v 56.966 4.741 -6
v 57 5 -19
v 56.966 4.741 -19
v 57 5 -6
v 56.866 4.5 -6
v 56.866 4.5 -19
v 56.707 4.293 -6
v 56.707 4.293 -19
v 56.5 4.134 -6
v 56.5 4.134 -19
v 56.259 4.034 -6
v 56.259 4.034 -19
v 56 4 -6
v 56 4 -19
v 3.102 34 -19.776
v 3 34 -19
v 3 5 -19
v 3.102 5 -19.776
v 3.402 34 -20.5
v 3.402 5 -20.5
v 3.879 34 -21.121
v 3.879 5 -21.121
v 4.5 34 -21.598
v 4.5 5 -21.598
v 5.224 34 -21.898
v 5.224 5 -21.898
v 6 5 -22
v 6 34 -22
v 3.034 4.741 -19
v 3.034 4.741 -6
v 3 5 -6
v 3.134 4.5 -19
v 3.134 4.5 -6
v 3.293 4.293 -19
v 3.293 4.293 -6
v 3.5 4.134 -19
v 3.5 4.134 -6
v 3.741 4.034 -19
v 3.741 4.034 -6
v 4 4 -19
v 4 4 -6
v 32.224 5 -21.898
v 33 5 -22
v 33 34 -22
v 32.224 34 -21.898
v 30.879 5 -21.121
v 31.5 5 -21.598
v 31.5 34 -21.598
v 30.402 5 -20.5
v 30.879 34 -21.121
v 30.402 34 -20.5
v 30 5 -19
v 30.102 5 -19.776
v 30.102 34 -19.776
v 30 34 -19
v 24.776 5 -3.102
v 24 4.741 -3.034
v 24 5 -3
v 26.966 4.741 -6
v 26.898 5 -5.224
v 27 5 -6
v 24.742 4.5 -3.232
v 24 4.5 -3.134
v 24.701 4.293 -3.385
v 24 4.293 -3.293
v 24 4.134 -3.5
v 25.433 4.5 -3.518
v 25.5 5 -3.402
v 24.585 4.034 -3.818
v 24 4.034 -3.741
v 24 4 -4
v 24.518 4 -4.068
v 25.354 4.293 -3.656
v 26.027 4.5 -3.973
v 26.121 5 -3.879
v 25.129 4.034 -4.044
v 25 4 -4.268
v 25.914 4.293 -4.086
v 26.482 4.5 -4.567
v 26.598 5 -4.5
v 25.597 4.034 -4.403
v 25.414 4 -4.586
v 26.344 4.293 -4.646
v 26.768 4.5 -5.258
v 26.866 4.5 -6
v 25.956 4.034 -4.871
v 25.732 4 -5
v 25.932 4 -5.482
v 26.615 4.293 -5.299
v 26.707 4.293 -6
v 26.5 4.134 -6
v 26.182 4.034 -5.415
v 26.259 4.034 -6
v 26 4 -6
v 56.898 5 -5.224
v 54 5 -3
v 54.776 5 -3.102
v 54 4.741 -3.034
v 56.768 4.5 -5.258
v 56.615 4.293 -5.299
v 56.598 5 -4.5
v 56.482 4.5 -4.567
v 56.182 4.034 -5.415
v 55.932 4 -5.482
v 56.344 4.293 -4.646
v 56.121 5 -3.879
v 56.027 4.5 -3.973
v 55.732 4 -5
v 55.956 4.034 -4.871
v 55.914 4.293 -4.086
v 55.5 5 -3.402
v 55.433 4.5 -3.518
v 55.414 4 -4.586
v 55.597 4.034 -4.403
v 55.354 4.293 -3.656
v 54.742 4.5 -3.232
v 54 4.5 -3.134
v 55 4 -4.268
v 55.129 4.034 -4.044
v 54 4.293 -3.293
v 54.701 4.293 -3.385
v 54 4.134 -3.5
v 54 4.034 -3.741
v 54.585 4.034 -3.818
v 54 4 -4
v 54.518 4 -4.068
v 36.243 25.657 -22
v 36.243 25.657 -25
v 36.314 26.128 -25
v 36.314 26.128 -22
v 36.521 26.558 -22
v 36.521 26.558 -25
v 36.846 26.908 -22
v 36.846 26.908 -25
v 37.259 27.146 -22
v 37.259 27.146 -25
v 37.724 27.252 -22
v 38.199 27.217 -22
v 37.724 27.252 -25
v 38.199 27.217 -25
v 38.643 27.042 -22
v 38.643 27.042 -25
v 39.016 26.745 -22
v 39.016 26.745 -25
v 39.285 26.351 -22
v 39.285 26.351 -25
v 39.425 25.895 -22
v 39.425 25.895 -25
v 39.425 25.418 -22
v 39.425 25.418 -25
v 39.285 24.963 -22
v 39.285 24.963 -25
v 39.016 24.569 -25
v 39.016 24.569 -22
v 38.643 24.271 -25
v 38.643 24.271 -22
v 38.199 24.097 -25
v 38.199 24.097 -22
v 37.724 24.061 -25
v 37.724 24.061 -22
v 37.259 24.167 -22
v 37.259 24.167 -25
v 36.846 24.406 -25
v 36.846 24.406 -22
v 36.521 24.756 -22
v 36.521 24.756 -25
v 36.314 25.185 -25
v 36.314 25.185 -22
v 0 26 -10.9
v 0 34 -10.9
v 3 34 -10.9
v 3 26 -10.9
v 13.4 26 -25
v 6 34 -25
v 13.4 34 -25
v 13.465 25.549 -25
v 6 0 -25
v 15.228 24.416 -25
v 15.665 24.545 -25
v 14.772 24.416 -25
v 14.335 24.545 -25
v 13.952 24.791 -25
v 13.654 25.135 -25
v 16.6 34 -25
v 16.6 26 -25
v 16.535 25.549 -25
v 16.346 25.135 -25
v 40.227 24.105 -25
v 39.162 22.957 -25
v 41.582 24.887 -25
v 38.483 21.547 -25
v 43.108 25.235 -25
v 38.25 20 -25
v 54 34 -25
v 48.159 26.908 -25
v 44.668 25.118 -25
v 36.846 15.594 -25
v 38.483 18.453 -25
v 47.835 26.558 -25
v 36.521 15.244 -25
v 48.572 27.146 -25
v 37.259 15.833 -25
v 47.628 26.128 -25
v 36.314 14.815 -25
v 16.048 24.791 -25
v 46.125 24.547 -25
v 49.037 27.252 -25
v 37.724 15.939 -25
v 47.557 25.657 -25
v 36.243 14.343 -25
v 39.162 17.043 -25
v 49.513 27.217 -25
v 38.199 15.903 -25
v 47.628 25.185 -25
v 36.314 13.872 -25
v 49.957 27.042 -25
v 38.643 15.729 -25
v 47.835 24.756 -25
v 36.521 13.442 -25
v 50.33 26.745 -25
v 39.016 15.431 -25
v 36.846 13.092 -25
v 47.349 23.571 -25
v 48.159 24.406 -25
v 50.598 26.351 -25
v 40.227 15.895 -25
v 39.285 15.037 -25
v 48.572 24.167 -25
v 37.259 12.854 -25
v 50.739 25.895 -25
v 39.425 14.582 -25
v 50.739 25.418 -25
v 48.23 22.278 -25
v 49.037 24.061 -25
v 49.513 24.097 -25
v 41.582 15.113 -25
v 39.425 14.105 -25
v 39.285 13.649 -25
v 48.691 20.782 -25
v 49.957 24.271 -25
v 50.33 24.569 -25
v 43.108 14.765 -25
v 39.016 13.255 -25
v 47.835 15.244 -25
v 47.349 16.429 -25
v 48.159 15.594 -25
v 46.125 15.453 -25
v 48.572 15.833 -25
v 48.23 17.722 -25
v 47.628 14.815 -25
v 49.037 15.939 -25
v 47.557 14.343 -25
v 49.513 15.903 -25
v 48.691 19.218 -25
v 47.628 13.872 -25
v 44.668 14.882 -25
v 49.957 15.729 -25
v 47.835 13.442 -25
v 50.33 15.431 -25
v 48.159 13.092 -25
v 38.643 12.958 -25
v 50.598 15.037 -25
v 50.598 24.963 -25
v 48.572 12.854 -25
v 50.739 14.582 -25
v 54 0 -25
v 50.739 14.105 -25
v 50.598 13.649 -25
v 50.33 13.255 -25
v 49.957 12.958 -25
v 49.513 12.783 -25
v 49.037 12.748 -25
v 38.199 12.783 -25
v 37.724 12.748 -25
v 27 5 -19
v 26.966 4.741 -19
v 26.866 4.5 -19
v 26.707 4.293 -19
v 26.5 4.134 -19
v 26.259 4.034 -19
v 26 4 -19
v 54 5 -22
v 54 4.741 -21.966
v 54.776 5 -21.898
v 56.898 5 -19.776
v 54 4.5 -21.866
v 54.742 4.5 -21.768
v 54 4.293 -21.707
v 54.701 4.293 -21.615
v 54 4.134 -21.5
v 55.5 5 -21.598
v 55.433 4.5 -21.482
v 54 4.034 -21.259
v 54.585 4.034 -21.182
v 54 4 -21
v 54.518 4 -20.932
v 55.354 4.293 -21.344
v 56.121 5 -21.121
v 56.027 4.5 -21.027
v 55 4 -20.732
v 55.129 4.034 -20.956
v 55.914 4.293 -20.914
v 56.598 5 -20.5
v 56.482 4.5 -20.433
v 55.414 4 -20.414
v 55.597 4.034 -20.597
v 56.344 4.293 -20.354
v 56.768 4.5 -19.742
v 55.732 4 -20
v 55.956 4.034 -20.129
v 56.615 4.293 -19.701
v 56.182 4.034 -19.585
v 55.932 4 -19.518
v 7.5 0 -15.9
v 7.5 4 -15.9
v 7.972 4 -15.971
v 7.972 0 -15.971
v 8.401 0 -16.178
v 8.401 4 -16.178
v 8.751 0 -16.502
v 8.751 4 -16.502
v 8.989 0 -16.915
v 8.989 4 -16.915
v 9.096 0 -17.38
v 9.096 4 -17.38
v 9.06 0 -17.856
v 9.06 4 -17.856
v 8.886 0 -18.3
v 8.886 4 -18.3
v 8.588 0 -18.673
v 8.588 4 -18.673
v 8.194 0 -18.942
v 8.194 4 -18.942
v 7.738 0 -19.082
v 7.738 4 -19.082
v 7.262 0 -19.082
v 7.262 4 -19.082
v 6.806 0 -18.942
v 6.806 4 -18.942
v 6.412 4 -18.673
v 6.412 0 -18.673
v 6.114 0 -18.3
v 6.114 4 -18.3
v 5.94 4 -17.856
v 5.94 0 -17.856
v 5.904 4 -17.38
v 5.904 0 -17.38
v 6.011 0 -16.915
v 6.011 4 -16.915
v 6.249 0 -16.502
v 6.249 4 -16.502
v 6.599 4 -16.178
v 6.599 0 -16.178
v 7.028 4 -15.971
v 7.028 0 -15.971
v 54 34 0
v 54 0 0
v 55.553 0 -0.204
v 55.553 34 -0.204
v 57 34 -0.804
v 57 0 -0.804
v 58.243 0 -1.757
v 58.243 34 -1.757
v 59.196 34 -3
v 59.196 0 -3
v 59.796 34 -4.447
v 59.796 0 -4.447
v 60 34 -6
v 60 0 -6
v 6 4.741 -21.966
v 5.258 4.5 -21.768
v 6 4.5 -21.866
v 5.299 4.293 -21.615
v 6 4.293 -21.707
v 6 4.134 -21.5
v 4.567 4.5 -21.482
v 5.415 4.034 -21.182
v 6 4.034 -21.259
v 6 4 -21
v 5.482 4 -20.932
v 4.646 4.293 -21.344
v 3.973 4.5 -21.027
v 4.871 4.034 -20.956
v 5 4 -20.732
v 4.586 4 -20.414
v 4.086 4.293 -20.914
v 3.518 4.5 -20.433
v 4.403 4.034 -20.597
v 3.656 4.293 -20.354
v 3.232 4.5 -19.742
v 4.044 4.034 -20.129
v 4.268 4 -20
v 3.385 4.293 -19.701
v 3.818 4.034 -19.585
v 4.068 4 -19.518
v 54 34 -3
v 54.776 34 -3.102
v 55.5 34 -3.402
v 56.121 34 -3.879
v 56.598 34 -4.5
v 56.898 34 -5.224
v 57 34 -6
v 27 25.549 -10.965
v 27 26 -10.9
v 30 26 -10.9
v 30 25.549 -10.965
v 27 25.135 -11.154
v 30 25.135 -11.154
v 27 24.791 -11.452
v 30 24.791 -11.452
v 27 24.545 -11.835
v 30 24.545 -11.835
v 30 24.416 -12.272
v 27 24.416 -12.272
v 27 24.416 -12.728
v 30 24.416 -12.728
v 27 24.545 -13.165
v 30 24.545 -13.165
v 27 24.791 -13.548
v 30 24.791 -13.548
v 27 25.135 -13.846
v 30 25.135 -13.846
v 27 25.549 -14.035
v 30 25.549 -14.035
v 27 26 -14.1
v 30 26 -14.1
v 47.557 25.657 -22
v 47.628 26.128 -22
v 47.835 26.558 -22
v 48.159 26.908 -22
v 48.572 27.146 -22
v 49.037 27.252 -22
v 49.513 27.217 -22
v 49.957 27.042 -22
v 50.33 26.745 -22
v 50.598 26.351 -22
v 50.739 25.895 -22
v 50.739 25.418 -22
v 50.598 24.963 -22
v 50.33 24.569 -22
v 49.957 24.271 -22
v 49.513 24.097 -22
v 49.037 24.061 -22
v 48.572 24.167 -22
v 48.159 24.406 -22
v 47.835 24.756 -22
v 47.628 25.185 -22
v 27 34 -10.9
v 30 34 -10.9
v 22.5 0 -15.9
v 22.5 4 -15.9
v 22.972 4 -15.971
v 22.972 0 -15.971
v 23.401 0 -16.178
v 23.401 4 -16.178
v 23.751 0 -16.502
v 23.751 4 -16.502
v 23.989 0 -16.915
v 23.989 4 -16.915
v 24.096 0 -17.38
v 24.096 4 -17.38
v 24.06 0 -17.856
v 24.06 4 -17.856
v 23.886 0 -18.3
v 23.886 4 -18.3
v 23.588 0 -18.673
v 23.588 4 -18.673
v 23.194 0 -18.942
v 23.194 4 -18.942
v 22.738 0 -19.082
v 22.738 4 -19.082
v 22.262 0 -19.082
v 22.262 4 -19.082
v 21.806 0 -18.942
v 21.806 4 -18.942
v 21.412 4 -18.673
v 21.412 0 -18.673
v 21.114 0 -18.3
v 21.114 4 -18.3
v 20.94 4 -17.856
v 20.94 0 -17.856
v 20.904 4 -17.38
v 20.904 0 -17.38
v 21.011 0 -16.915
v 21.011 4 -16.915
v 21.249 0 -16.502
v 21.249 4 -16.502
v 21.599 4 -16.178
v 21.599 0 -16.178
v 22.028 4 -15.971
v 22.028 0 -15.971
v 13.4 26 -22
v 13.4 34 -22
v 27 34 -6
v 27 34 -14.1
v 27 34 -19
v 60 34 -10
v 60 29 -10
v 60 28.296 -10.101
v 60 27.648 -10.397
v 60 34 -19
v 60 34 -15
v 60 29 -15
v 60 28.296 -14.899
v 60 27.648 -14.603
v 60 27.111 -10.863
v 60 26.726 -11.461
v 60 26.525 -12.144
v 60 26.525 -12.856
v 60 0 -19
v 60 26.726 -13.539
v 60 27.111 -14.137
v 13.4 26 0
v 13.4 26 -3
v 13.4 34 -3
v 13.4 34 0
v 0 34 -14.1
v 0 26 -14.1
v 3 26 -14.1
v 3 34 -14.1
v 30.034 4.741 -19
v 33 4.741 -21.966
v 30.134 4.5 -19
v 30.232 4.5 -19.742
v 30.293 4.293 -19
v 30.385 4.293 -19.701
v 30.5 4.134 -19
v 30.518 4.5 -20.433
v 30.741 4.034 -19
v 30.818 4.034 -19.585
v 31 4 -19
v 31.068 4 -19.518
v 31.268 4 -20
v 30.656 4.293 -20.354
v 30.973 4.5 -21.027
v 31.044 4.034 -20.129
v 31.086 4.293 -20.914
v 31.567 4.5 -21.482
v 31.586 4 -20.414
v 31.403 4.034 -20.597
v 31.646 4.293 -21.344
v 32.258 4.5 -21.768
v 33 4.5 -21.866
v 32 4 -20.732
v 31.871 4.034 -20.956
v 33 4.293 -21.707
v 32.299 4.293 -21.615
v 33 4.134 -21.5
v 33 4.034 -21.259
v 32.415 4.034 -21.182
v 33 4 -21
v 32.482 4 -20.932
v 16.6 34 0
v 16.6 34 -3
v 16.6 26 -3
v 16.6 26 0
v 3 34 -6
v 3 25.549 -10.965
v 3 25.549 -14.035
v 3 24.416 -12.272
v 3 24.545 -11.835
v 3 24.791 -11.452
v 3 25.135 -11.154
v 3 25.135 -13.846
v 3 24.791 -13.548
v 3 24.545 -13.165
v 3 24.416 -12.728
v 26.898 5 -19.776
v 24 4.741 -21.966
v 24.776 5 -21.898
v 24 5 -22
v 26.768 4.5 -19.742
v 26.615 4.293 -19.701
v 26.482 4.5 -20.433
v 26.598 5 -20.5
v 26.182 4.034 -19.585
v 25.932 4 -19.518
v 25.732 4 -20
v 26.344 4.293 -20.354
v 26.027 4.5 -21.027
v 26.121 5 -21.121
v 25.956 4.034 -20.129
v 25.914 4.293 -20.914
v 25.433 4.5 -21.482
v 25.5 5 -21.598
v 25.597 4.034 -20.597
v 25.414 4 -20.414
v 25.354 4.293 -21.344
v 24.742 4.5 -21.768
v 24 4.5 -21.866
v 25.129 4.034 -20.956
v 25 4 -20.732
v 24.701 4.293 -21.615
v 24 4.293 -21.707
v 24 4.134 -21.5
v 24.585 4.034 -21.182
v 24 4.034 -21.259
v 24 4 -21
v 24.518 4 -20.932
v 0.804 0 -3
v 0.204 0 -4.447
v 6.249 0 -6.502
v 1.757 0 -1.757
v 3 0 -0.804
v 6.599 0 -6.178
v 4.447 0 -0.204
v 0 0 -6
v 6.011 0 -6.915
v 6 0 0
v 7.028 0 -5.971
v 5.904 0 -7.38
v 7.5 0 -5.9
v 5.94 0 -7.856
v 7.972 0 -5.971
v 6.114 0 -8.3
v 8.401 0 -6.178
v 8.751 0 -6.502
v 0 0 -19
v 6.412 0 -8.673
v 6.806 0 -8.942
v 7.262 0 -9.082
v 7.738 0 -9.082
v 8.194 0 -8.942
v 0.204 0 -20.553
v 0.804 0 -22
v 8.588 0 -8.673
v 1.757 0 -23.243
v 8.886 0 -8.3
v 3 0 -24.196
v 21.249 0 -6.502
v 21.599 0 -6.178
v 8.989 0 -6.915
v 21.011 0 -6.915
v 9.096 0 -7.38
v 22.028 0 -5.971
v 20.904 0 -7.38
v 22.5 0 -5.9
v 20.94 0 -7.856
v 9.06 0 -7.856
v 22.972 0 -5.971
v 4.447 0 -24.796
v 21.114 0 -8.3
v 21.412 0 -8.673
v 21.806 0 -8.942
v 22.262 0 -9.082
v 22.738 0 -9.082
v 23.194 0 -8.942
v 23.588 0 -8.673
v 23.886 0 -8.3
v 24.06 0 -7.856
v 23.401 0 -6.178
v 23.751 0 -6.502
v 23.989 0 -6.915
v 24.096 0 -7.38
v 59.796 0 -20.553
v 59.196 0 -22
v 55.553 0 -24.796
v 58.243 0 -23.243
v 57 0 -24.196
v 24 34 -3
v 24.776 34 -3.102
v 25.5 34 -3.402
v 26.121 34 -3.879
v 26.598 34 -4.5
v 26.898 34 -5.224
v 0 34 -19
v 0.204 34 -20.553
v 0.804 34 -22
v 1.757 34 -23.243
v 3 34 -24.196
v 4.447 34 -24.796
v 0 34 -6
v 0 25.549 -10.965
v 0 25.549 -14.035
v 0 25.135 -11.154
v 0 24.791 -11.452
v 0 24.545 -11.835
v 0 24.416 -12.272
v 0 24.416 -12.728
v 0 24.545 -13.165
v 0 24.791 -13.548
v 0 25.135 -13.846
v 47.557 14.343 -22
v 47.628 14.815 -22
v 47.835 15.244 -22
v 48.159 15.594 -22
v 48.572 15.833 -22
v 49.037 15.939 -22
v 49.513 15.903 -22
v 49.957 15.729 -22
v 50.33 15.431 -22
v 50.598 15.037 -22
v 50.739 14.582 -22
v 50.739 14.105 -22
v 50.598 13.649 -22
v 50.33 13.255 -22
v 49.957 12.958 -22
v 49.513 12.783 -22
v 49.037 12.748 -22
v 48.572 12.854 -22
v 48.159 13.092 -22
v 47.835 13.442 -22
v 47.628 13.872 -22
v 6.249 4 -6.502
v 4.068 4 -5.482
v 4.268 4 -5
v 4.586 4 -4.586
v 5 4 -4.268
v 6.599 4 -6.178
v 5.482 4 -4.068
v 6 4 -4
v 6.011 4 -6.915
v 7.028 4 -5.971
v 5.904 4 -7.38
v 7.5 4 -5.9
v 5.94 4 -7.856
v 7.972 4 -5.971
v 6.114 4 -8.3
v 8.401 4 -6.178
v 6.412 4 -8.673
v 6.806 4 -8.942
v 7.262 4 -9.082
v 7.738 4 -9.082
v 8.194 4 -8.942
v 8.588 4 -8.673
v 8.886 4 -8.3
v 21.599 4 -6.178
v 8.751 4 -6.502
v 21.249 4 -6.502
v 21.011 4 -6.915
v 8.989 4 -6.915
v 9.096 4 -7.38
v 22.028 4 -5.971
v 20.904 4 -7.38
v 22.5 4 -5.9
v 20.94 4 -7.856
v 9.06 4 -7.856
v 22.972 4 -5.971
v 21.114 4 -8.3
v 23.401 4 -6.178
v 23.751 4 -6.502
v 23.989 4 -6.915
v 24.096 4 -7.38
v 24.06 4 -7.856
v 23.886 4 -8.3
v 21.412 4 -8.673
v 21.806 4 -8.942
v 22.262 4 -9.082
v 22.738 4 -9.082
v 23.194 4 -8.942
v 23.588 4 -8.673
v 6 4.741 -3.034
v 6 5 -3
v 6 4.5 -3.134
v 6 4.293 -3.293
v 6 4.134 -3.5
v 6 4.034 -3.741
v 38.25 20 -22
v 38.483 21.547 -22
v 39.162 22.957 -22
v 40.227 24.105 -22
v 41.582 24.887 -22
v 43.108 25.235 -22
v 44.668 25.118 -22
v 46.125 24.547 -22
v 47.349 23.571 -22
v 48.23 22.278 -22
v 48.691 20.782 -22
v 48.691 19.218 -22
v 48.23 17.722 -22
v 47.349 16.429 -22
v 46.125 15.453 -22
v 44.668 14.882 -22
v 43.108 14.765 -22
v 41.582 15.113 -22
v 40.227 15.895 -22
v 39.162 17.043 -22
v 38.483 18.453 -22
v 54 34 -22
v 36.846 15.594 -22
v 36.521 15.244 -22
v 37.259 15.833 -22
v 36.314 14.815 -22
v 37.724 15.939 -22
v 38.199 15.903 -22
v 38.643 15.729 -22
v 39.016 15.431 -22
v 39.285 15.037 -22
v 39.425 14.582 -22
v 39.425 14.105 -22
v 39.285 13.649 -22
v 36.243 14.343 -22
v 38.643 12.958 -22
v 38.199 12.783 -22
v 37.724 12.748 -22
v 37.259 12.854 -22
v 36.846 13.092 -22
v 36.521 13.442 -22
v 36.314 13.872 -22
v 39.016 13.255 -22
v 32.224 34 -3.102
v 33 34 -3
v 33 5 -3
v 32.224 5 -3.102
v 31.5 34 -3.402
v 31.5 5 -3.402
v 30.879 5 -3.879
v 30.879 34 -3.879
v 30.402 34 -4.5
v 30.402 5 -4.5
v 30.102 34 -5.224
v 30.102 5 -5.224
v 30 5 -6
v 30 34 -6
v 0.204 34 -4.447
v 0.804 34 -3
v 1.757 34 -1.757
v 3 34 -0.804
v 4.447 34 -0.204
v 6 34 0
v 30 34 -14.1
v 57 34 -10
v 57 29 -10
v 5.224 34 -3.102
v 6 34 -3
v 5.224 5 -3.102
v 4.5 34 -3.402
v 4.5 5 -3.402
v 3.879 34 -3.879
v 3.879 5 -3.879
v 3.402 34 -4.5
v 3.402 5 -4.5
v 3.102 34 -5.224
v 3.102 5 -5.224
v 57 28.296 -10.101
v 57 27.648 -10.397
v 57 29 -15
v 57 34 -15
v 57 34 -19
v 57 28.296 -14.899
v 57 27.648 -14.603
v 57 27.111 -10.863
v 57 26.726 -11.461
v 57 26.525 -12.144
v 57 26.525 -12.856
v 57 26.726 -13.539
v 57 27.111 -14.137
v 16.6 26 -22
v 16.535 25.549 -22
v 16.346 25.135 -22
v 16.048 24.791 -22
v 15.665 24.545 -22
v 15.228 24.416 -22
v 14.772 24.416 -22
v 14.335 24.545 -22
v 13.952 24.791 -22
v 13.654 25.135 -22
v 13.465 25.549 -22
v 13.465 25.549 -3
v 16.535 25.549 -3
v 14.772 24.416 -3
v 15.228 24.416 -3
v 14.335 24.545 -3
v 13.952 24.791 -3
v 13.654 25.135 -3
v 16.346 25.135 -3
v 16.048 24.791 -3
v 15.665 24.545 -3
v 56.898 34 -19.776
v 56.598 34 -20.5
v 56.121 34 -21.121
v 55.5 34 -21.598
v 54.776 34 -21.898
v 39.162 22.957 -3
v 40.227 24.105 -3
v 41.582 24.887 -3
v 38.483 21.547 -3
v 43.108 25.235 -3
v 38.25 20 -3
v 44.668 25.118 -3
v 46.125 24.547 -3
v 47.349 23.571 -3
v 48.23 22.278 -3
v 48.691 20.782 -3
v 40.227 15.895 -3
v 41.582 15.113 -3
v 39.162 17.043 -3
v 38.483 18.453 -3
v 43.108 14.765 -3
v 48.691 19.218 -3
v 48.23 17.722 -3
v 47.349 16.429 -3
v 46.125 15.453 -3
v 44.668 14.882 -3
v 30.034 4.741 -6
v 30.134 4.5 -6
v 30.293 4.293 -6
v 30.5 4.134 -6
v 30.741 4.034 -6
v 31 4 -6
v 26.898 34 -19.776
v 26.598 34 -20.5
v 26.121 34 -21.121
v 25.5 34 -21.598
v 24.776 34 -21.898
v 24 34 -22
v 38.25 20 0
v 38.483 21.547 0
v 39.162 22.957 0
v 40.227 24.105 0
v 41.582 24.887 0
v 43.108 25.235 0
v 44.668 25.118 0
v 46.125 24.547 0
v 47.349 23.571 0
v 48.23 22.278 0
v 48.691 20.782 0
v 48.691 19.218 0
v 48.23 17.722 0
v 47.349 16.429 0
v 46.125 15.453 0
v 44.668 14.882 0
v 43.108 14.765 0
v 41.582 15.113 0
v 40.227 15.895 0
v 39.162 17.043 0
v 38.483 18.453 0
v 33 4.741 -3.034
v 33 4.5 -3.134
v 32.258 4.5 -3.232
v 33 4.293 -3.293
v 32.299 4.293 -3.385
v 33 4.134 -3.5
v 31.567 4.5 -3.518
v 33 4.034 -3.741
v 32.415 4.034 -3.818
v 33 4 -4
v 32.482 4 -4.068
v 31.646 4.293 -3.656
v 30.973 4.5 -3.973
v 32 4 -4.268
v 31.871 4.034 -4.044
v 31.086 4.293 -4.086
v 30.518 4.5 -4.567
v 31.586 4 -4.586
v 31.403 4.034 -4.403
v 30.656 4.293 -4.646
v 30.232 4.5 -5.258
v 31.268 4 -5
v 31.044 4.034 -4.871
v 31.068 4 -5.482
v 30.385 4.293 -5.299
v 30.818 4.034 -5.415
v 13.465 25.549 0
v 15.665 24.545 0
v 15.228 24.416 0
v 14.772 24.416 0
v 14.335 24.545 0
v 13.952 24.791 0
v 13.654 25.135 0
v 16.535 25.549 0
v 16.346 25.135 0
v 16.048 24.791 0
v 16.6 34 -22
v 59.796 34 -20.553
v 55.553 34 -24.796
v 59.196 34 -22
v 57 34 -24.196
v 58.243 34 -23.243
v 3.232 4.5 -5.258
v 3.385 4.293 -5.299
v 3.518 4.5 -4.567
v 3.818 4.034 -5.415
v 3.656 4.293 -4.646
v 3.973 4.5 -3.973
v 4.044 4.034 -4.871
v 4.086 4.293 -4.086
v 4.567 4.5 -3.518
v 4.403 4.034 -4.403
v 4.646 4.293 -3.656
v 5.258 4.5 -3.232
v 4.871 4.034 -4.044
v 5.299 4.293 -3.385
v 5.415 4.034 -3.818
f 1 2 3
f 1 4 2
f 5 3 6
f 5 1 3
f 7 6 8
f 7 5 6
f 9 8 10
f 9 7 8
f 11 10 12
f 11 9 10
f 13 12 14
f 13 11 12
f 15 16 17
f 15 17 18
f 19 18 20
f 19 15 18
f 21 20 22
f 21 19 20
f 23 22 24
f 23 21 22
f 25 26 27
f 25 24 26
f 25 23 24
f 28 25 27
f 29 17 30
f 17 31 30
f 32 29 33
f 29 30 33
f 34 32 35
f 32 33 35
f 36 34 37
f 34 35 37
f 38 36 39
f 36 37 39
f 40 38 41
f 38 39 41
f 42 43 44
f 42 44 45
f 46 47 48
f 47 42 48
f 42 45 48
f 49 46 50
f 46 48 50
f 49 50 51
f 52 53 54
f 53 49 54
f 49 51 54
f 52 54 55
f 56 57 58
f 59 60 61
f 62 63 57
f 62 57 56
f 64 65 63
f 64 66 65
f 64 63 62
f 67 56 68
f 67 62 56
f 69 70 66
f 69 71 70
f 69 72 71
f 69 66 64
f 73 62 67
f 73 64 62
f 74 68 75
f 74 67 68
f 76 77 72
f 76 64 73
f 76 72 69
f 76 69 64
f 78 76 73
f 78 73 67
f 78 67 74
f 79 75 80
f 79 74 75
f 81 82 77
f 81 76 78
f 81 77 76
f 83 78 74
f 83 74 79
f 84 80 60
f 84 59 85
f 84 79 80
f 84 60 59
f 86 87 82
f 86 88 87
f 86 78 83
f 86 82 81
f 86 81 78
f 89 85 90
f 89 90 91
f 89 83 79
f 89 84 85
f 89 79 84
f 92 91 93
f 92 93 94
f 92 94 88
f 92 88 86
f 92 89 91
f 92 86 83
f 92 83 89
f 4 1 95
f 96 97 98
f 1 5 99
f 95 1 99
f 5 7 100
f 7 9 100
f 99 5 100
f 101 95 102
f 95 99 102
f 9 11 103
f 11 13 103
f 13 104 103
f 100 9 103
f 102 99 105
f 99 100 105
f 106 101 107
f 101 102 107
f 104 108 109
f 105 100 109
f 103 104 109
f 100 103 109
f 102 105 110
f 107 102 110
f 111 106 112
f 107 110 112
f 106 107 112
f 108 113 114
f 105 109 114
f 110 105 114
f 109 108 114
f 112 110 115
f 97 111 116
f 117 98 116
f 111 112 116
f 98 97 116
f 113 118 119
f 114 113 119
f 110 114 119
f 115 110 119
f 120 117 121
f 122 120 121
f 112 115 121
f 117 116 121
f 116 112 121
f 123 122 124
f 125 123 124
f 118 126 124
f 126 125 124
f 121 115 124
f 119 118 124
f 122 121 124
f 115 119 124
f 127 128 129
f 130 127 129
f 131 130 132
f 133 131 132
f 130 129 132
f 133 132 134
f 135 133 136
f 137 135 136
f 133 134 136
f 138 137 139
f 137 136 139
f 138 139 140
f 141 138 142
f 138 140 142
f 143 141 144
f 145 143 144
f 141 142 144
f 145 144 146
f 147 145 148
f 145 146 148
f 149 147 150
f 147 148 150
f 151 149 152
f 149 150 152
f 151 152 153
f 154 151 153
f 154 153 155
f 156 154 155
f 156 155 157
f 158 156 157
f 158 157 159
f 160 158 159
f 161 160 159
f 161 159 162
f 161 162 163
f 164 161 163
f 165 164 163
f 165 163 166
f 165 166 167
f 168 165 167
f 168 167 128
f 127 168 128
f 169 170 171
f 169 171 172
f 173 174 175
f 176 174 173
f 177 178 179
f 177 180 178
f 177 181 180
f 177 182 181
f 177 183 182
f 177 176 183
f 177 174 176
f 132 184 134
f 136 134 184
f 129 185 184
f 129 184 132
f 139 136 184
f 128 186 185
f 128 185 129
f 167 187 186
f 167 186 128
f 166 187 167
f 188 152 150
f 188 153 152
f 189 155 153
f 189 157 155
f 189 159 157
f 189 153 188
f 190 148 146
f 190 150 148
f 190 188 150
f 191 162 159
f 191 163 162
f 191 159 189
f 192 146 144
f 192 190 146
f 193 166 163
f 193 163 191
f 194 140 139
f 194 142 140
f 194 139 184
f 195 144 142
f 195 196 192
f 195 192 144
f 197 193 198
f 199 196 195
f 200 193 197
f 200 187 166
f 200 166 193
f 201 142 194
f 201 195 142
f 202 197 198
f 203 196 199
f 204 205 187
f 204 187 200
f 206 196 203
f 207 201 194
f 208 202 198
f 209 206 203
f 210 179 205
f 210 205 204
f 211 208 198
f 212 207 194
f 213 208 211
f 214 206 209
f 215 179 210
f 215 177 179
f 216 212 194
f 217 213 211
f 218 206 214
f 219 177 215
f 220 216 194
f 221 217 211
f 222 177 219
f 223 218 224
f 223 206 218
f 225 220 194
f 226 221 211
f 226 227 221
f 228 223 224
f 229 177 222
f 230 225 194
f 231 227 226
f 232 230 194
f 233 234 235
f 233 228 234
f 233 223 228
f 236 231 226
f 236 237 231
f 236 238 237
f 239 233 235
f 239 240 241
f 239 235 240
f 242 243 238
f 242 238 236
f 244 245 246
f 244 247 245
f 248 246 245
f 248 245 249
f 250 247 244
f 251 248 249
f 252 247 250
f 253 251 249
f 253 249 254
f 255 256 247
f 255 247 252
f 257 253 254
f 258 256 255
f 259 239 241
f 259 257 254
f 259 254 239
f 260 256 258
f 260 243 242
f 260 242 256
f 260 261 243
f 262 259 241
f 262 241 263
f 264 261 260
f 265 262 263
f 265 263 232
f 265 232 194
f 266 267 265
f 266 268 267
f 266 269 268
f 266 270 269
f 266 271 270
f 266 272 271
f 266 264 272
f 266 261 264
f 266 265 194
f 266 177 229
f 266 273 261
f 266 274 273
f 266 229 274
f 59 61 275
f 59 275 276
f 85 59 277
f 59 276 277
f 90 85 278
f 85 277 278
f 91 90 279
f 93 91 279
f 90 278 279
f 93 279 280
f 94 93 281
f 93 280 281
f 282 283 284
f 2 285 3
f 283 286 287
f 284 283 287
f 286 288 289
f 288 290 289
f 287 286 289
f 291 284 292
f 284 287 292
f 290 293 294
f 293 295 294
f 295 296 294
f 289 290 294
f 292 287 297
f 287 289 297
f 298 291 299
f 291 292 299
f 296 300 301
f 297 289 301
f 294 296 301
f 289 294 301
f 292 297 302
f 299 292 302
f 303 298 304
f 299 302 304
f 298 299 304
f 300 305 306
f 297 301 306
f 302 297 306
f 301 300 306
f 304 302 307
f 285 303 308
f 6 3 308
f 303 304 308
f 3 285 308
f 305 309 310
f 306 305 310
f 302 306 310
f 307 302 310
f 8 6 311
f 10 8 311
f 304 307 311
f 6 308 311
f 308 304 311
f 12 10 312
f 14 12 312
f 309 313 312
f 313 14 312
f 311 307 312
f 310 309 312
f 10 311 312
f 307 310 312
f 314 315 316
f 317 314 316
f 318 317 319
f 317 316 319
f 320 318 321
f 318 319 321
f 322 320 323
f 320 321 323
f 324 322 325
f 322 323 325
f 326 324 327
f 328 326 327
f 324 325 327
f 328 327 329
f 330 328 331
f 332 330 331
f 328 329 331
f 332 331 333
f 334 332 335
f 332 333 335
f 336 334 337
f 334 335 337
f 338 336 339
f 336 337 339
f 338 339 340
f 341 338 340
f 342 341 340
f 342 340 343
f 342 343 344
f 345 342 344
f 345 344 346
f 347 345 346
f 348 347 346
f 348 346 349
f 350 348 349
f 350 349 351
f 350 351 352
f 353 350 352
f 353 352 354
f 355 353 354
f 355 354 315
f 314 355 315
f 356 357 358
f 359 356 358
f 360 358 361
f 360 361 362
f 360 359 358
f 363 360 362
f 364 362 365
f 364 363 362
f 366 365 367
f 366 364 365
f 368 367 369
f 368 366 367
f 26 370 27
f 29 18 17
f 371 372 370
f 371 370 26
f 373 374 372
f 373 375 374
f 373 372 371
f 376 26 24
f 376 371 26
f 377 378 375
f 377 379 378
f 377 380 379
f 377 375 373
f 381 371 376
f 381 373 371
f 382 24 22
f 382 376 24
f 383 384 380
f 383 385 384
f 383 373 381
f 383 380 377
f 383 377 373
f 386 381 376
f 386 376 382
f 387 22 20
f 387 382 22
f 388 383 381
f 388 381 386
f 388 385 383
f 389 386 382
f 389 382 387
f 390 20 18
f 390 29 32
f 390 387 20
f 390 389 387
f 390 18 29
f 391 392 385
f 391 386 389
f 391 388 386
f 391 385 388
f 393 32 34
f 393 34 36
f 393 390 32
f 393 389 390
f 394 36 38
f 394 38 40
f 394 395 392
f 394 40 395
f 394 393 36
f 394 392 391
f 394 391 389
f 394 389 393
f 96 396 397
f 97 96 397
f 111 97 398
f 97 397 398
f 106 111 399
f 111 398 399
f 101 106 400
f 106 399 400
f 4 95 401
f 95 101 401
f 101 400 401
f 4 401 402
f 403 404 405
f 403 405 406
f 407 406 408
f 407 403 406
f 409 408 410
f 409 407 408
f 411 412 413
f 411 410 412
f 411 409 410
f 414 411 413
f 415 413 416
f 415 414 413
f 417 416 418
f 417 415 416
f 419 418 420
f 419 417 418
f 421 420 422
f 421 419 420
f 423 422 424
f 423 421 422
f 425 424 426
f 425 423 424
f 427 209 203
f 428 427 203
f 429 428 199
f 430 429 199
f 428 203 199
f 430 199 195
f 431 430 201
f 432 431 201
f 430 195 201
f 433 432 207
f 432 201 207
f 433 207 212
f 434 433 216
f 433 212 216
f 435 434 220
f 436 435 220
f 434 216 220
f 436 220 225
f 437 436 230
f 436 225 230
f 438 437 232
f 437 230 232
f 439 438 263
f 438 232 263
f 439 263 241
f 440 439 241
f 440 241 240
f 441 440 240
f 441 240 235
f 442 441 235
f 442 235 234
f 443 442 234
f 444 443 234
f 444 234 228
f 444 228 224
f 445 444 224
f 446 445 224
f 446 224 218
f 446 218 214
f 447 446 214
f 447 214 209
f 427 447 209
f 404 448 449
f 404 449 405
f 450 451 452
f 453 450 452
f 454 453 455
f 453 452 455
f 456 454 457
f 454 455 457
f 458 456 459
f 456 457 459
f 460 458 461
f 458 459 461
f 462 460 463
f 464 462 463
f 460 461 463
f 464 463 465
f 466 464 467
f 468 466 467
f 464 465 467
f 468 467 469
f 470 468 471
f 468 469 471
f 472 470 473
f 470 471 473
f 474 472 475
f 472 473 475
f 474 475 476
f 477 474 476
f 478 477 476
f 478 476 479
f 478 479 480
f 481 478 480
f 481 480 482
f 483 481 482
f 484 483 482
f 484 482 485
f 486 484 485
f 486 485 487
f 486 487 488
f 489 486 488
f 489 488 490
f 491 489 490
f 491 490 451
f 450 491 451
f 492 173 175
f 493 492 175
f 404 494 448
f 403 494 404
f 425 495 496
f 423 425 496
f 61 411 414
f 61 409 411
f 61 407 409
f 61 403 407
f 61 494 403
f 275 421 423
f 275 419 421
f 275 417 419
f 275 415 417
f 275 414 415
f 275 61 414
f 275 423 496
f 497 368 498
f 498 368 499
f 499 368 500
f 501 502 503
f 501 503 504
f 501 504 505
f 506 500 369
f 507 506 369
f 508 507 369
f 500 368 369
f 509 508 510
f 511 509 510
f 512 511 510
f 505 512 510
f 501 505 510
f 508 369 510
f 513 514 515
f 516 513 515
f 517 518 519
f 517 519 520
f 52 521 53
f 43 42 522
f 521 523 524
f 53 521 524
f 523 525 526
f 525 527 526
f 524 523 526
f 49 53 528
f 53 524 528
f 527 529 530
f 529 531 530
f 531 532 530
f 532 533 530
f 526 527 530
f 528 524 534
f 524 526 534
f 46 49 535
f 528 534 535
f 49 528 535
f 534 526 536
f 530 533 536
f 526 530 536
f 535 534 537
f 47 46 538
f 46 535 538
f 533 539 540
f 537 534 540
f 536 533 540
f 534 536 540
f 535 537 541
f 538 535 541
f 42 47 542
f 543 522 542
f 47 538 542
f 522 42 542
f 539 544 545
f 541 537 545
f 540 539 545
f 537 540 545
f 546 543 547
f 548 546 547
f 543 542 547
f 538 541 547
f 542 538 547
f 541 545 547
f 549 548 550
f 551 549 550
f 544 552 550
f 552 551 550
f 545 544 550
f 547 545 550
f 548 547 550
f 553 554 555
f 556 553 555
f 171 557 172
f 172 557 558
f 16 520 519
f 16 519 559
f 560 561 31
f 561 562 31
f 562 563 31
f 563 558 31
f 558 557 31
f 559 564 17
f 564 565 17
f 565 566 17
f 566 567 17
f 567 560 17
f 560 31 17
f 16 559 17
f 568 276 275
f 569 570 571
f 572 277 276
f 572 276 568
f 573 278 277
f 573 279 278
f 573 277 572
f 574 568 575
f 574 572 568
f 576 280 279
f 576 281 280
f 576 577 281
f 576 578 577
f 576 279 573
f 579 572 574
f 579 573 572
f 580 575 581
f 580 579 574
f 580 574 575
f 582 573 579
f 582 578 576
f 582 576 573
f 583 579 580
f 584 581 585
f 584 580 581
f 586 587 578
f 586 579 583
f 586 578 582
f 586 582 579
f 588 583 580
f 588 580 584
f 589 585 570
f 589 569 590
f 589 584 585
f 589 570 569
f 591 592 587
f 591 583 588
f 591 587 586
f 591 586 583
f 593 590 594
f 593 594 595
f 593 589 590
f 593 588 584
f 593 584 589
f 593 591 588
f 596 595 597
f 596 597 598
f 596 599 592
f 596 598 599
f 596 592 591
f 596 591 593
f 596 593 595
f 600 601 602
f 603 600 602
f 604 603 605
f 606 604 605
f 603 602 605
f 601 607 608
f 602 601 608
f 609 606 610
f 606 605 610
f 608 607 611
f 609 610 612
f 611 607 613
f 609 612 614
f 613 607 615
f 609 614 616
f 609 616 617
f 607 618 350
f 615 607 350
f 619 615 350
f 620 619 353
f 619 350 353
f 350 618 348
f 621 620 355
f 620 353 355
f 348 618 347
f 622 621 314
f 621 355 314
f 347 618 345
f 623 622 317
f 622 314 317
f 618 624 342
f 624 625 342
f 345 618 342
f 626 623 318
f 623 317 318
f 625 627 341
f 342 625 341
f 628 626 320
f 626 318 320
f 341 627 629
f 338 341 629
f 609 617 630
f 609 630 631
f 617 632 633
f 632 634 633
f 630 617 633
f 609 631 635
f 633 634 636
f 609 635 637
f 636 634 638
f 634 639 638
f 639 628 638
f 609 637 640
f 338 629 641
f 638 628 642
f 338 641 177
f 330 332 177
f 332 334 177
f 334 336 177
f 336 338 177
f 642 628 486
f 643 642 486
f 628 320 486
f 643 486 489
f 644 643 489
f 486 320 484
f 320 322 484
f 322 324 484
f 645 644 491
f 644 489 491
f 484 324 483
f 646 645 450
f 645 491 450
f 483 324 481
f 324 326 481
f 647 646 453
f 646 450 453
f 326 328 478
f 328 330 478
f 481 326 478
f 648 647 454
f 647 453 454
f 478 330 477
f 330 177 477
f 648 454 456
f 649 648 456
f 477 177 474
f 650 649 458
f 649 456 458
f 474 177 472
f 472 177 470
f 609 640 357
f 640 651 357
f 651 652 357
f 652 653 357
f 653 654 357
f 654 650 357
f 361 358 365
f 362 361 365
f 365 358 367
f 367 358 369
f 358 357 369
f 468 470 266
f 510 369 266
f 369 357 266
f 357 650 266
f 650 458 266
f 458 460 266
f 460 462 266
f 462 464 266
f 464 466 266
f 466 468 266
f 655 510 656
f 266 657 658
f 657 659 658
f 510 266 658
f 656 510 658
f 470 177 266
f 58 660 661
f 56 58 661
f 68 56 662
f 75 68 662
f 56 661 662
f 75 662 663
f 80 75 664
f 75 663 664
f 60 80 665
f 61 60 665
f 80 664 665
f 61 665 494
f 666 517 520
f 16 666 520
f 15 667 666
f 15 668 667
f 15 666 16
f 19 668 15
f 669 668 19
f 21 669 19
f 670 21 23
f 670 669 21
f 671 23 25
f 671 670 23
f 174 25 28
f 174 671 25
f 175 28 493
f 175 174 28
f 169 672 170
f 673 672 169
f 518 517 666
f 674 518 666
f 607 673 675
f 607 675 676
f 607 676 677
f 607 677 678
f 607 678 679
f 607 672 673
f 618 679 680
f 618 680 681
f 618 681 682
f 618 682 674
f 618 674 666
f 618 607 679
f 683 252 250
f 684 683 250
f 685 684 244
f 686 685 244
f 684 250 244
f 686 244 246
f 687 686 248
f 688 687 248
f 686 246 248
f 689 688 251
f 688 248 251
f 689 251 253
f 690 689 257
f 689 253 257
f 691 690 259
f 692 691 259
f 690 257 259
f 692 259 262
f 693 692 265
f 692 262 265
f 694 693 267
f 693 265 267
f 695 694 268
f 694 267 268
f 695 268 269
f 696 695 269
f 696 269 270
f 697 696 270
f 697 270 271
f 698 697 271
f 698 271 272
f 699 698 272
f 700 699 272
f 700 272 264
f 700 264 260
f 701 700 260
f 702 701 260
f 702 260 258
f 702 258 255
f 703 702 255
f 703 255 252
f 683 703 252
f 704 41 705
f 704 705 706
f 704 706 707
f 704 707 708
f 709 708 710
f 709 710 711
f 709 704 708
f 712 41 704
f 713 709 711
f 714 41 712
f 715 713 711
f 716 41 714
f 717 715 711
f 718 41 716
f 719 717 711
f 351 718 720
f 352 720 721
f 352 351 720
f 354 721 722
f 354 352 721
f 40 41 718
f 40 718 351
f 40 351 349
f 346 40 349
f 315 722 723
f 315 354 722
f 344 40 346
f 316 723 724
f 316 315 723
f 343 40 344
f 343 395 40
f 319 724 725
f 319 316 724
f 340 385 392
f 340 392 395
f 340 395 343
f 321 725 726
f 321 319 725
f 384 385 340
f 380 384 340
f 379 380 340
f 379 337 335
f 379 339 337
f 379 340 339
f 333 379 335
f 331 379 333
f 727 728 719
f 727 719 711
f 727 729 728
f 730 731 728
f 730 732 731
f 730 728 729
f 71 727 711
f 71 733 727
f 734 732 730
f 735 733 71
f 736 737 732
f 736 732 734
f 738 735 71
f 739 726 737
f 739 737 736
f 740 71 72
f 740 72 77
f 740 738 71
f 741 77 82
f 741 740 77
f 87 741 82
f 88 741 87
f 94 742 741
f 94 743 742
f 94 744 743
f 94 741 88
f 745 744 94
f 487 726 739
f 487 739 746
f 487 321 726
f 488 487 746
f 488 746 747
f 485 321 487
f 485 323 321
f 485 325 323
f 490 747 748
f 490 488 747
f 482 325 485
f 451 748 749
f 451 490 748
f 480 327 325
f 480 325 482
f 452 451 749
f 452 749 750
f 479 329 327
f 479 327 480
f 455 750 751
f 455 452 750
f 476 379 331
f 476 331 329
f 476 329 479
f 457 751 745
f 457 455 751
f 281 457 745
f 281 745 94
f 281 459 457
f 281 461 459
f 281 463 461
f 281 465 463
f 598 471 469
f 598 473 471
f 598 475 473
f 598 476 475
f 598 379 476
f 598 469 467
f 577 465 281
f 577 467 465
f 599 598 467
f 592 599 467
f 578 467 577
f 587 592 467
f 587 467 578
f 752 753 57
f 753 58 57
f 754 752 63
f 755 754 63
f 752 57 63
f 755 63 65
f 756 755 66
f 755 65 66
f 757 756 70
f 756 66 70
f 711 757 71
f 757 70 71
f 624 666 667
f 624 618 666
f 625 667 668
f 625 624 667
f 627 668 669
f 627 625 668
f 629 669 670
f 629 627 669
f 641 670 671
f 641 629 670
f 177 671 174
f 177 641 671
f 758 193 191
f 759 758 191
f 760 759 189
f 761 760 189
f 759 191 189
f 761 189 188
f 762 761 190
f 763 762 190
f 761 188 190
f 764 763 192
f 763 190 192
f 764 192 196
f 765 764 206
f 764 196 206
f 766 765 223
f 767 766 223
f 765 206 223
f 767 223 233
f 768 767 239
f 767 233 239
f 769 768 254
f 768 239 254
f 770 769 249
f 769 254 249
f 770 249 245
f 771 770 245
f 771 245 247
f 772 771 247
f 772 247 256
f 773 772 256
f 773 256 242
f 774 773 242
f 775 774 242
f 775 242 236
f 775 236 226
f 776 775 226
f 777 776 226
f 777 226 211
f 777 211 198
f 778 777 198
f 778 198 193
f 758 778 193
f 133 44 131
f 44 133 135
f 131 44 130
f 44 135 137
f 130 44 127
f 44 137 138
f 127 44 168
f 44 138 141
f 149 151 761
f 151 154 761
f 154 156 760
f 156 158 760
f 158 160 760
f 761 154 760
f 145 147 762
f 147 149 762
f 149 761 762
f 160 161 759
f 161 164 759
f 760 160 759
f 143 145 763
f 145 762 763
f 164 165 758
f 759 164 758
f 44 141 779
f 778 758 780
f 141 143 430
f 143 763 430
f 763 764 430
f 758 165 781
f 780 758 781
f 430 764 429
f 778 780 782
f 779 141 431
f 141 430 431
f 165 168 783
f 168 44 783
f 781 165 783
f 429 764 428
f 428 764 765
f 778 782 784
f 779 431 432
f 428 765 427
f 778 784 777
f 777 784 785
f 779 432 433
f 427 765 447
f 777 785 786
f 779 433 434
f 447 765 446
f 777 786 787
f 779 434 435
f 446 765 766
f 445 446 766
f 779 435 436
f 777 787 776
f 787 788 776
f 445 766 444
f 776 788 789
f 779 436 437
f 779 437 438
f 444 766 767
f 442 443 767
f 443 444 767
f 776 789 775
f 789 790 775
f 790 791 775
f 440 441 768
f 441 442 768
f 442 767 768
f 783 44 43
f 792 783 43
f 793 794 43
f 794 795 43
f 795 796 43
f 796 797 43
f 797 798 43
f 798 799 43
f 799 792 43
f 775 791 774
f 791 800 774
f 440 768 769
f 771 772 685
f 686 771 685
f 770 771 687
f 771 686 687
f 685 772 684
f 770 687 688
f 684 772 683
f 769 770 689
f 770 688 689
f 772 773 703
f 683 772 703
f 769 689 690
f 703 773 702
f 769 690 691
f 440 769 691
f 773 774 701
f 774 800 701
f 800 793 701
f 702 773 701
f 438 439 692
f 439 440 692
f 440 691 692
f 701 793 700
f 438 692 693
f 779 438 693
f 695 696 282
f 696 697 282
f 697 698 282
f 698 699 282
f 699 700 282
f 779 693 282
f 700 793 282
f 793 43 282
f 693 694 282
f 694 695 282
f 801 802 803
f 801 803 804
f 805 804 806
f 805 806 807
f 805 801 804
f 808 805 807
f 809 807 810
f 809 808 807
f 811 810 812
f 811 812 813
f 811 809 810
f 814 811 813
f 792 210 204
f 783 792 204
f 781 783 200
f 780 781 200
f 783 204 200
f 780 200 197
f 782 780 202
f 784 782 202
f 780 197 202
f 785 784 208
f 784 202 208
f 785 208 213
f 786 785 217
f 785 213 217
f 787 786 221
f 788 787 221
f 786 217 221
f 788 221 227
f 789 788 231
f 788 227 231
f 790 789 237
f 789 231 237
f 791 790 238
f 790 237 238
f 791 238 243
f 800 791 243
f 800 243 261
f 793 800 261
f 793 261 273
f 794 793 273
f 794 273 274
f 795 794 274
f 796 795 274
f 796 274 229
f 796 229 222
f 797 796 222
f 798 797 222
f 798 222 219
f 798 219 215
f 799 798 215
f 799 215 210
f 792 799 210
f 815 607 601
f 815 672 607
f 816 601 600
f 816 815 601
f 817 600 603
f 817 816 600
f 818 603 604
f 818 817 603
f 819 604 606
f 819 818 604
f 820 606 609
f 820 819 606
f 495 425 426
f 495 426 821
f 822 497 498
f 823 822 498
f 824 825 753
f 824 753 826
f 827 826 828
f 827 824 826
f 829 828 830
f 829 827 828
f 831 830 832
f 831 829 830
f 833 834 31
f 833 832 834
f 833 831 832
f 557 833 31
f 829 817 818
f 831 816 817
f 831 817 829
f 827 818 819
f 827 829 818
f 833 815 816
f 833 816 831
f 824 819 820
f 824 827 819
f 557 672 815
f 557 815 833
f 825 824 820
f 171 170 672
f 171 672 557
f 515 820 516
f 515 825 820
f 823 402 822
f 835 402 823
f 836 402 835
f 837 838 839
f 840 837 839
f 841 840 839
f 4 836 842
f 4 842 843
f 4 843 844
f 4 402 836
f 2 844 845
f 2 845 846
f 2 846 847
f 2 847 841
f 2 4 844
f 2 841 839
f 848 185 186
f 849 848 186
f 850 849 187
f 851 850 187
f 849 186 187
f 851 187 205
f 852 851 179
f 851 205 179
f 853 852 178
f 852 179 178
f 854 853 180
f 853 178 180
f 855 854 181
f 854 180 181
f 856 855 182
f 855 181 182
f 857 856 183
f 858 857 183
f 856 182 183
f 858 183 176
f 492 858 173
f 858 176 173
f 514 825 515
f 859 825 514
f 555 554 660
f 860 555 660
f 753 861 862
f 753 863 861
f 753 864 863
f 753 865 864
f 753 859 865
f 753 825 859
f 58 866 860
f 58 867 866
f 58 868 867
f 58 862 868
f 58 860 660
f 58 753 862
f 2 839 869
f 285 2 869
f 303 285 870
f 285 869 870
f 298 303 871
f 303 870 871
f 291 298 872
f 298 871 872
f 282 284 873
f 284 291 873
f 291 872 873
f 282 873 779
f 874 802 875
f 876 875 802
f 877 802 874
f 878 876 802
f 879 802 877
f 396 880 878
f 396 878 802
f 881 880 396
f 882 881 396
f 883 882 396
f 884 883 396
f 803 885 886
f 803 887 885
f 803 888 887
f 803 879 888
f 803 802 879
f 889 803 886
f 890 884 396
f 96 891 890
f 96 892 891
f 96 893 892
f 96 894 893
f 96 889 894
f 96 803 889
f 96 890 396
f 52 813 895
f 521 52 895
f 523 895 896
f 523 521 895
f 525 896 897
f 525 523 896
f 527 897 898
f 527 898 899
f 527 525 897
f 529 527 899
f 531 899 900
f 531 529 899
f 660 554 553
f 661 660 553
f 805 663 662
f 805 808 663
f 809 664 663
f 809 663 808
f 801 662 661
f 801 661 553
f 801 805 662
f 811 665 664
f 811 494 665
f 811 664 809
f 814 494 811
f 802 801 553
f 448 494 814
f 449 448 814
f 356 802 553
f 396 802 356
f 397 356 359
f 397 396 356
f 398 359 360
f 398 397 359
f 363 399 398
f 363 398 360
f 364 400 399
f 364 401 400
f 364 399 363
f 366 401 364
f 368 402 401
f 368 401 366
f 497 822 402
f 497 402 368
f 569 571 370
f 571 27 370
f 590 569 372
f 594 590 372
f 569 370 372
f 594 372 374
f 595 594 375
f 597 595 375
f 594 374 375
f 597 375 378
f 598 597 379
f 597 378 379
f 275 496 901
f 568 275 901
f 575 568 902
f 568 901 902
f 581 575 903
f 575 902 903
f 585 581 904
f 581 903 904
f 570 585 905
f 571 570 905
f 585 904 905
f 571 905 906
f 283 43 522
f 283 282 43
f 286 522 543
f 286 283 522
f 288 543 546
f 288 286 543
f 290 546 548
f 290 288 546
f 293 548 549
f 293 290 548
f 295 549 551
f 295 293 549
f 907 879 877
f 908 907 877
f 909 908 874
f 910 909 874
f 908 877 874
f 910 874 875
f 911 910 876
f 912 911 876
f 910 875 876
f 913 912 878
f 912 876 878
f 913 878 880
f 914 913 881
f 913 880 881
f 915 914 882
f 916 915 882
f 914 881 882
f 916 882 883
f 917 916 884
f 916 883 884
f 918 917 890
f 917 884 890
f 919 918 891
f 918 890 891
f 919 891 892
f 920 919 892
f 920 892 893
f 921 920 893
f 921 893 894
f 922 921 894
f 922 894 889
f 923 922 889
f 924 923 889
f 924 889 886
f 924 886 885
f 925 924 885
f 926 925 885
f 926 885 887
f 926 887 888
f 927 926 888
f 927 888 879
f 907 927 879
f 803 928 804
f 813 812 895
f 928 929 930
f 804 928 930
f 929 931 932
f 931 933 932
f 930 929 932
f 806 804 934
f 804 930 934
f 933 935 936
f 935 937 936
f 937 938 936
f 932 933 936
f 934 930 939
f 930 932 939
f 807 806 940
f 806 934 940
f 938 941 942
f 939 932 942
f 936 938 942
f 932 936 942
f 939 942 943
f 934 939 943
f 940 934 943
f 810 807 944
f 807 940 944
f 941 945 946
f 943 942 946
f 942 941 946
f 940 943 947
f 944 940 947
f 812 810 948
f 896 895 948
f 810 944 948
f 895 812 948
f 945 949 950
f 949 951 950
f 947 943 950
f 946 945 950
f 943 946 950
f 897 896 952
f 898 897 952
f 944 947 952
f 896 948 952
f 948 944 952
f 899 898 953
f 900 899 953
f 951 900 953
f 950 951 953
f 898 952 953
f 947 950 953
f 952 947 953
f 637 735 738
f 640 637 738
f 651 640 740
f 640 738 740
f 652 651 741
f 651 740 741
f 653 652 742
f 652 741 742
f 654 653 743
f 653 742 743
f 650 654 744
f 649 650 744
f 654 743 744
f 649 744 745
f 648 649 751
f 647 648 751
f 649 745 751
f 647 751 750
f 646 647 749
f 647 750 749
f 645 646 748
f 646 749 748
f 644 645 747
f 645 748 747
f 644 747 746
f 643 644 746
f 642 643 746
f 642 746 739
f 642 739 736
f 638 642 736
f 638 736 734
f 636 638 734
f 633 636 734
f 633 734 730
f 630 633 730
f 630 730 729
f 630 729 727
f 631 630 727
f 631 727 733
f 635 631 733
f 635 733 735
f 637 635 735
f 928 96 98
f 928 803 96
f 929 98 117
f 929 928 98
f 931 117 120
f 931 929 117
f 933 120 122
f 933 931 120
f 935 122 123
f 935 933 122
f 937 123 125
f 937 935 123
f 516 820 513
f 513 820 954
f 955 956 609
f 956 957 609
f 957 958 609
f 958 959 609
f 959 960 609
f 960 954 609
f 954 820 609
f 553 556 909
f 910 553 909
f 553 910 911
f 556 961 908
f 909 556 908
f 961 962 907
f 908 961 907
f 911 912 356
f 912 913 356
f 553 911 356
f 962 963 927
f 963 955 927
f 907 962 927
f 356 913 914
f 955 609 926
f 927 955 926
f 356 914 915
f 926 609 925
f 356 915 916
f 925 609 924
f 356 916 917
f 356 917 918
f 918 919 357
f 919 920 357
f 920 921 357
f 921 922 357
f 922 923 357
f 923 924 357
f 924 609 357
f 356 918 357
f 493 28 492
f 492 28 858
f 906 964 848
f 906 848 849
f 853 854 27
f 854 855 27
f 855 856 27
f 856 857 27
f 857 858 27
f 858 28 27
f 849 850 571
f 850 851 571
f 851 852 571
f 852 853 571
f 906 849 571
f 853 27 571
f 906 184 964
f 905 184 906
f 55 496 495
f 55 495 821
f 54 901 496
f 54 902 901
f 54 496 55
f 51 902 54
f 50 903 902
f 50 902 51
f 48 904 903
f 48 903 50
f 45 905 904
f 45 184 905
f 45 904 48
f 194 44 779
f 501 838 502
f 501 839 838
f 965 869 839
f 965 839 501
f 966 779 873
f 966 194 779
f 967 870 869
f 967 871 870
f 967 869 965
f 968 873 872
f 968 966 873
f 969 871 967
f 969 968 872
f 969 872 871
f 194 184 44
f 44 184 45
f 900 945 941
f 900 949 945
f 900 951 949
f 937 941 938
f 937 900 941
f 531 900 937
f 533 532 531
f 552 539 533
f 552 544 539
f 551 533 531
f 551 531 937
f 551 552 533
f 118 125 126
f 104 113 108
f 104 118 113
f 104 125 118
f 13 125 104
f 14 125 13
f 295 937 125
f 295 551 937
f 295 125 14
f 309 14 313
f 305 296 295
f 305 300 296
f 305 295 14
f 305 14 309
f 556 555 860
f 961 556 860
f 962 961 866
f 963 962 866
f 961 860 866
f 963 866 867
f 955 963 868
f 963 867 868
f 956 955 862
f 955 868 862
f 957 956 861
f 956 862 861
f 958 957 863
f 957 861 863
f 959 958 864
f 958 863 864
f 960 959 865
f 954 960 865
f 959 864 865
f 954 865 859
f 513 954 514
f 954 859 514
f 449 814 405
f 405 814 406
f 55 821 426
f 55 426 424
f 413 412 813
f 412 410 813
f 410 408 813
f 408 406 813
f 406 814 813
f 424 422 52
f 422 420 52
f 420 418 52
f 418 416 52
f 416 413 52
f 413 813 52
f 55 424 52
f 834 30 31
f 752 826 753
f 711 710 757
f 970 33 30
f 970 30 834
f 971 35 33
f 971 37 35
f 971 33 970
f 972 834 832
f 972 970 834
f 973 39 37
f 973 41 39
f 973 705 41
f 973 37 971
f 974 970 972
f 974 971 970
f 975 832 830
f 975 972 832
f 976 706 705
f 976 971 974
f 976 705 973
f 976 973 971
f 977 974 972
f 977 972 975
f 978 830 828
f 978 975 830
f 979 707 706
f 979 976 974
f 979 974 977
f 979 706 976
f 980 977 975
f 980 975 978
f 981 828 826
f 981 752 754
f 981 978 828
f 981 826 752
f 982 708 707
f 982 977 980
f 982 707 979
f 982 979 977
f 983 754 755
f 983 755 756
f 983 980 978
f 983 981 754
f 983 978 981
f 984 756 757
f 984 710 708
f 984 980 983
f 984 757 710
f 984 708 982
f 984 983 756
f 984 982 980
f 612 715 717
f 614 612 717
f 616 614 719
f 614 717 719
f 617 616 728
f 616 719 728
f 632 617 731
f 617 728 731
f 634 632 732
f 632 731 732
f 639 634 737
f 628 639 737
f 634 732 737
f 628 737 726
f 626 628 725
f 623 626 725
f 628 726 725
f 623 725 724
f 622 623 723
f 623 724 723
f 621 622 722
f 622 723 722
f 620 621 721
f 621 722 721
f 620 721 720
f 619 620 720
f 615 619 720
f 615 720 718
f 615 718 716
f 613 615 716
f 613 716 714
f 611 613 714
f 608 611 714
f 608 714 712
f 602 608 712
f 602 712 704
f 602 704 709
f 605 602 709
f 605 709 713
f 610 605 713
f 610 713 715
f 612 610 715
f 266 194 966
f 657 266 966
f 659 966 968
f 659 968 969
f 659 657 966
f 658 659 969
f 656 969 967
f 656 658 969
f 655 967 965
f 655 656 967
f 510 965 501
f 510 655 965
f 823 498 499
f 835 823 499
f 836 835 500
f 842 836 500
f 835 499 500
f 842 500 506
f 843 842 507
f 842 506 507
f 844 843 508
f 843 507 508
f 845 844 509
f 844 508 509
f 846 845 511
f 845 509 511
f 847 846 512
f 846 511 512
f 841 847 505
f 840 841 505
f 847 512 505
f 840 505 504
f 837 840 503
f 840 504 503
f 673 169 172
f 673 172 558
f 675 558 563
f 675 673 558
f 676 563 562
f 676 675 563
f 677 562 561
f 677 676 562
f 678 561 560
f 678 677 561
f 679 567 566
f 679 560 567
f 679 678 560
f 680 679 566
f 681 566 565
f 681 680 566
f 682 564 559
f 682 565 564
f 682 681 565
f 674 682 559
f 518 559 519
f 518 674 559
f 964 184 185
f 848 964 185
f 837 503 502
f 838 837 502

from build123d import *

# Parameters (mm, degrees)
SKETCH1_W           = 60
SKETCH1_H           = 25
BOSS_EXTRUDE1_DEPTH = 4
SKETCH3_R           = 1.6
CUT_EXTRUDE1_DEPTH  = 66.122960621
SKETCH4_W           = 60
SKETCH4_H           = 25
SKETCH4_W_2         = 24
SKETCH4_H_2         = 19
SKETCH4_W_3         = 27
BOSS_EXTRUDE2_DEPTH = 30
SKETCH5_R           = 5.25
CUT_EXTRUDE2_DEPTH  = 74.35529974
CUT_EXTRUDE3_REACH  = 75.355
SKETCH6_R           = 1.6
FILLET3_R           = 3
FILLET4_R           = 1
FILLET5_R           = 6
CUT_EXTRUDE4_DEPTH  = 74.35529974
CUT_EXTRUDE5_REACH  = 75.355
CUT_EXTRUDE6_REACH  = 75.355


with BuildPart() as part:
    # Sketch1 → Boss-Extrude1 (new body)
    with BuildSketch(Plane(origin=(0, 0, 0), x_dir=(1, 0, 0), z_dir=(0, 1, 0))):
        with Locations((30, 12.5)):
            Rectangle(SKETCH1_W, SKETCH1_H)
    extrude(amount=BOSS_EXTRUDE1_DEPTH)

    # Sketch3 → Cut-Extrude1 (cut, through all)
    with BuildSketch(Plane(origin=(0, 4, 0), x_dir=(1, 0, 0), z_dir=(0, 1, 0))):
        with Locations(Location((7.5, 17.5, 0), (0, 0, 270))):
            Circle(SKETCH3_R)
        with Locations(Location((22.5, 17.5, 0), (0, 0, 270))):
            Circle(SKETCH3_R)
        with Locations(Location((22.5, 7.5, 0), (0, 0, 270))):
            Circle(SKETCH3_R)
        with Locations(Location((7.5, 7.5, 0), (0, 0, 270))):
            Circle(SKETCH3_R)
    extrude(amount=-CUT_EXTRUDE1_DEPTH, mode=Mode.SUBTRACT)

    # Sketch4 → Boss-Extrude2 (add)
    with BuildSketch(Plane(origin=(0, 4, 0), x_dir=(1, 0, 0), z_dir=(0, 1, 0))):
        with Locations((30, 12.5)):
            Rectangle(SKETCH4_W, SKETCH4_H)
        with Locations((15, 12.5)):
            Rectangle(SKETCH4_W_2, SKETCH4_H_2, mode=Mode.SUBTRACT)
        with Locations((43.5, 12.5)):
            Rectangle(SKETCH4_W_3, SKETCH4_H_2, mode=Mode.SUBTRACT)
    extrude(amount=BOSS_EXTRUDE2_DEPTH)

    # Sketch5 → Cut-Extrude2 (cut, through all)
    with BuildSketch(Plane(origin=(0, 0, -25), x_dir=(-1, 0, 0), z_dir=(0, 0, -1))):
        with Locations((-43.5, 20)):
            Circle(SKETCH5_R)
    extrude(amount=-CUT_EXTRUDE2_DEPTH, mode=Mode.SUBTRACT)

    # Sketch6 → Cut-Extrude3 (cut, up to next)
    with BuildSketch(Plane(origin=(0, 0, -25), x_dir=(-1, 0, 0), z_dir=(0, 0, -1)), mode=Mode.PRIVATE) as cut_extrude3_sk1:
        with Locations((-37.843145751, 14.343145751)):
            Circle(SKETCH6_R)
    cut_extrude3_tool1 = extrude(cut_extrude3_sk1.sketch, amount=-CUT_EXTRUDE3_REACH, mode=Mode.PRIVATE) & part.part
    # Sketch6 → Cut-Extrude3 (cut, up to next)
    with BuildSketch(Plane(origin=(0, 0, -25), x_dir=(-1, 0, 0), z_dir=(0, 0, -1)), mode=Mode.PRIVATE) as cut_extrude3_sk2:
        with Locations((-49.156854249, 14.343145751)):
            Circle(SKETCH6_R)
    cut_extrude3_tool2 = extrude(cut_extrude3_sk2.sketch, amount=-CUT_EXTRUDE3_REACH, mode=Mode.PRIVATE) & part.part
    # Sketch6 → Cut-Extrude3 (cut, up to next)
    with BuildSketch(Plane(origin=(0, 0, -25), x_dir=(-1, 0, 0), z_dir=(0, 0, -1)), mode=Mode.PRIVATE) as cut_extrude3_sk3:
        with Locations((-49.156854249, 25.656854249)):
            Circle(SKETCH6_R)
    cut_extrude3_tool3 = extrude(cut_extrude3_sk3.sketch, amount=-CUT_EXTRUDE3_REACH, mode=Mode.PRIVATE) & part.part
    # Sketch6 → Cut-Extrude3 (cut, up to next)
    with BuildSketch(Plane(origin=(0, 0, -25), x_dir=(-1, 0, 0), z_dir=(0, 0, -1)), mode=Mode.PRIVATE) as cut_extrude3_sk4:
        with Locations((-37.843145751, 25.656854249)):
            Circle(SKETCH6_R)
    cut_extrude3_tool4 = extrude(cut_extrude3_sk4.sketch, amount=-CUT_EXTRUDE3_REACH, mode=Mode.PRIVATE) & part.part
    add(cut_extrude3_tool1.solids().sort_by_distance((37.843146, 14.343146, -25))[0], mode=Mode.SUBTRACT)
    add(cut_extrude3_tool2.solids().sort_by_distance((49.156854, 14.343146, -25))[0], mode=Mode.SUBTRACT)
    add(cut_extrude3_tool3.solids().sort_by_distance((49.156854, 25.656854, -25))[0], mode=Mode.SUBTRACT)
    add(cut_extrude3_tool4.solids().sort_by_distance((37.843146, 25.656854, -25))[0], mode=Mode.SUBTRACT)

    # Fillet3
    fillet3_edges = [part.edges().sort_by_distance(p)[0] for p in [
        (3, 19, -3),
        (27, 19, -3),
        (27, 19, -22),
        (3, 19, -22),
        (57, 19, -3),
        (57, 19, -22),
        (30, 19, -22),
        (30, 19, -3),
    ]]
    fillet(fillet3_edges, radius=FILLET3_R)

    # Fillet4
    fillet4_edges = [part.edges().sort_by_distance(p)[0] for p in [
        (15, 4, -3),
        (15, 4, -22),
        (3, 4, -12.5),
        (27, 4, -12.5),
        (26.121320344, 4, -21.121320344),
        (3.878679656, 4, -21.121320344),
        (3.878679656, 4, -3.878679656),
        (26.121320344, 4, -3.878679656),
        (30, 4, -12.5),
        (43.5, 4, -3),
        (57, 4, -12.5),
        (43.5, 4, -22),
        (30.878679656, 4, -21.121320344),
        (56.121320344, 4, -21.121320344),
        (56.121320344, 4, -3.878679656),
        (30.878679656, 4, -3.878679656),
    ]]
    fillet(fillet4_edges, radius=FILLET4_R)

    # Fillet5
    fillet5_edges = [part.edges().sort_by_distance(p)[0] for p in [
        (0, 17, -25),
        (60, 17, -25),
        (60, 17, 0),
        (0, 17, 0),
    ]]
    fillet(fillet5_edges, radius=FILLET5_R)

    # Sketch7 → Cut-Extrude4 (cut, through all)
    with BuildSketch(Plane(origin=(0, 0, -25), x_dir=(-1, 0, 0), z_dir=(0, 0, -1))):
        with BuildLine():
            Line((-13.4, 26), (-13.4, 34))
            Line((-13.4, 34), (-16.6, 34))
            Line((-16.6, 34), (-16.6, 26))
            ThreePointArc((-16.6, 26), (-15, 24.4), (-13.4, 26))
        make_face()
    extrude(amount=-CUT_EXTRUDE4_DEPTH, mode=Mode.SUBTRACT)

    # Cut-Extrude5: up to this face of the body (flat: up to its plane)
    cut_extrude5_end = Plane(part.part.faces().sort_by_distance((30, 19.5, -12.5))[0])
    # Sketch8 → Cut-Extrude5 (cut, up to the picked face)
    with BuildSketch(Plane.ZY, mode=Mode.PRIVATE) as cut_extrude5_sk1:
        with BuildLine():
            Line((-14.1, 26), (-14.1, 34))
            Line((-14.1, 34), (-10.9, 34))
            Line((-10.9, 34), (-10.9, 26))
            ThreePointArc((-10.9, 26), (-12.5, 24.4), (-14.1, 26))
        make_face()
    cut_extrude5_tool1 = split(extrude(cut_extrude5_sk1.sketch, amount=-CUT_EXTRUDE5_REACH, mode=Mode.PRIVATE), bisect_by=cut_extrude5_end, keep=Keep.BOTH, mode=Mode.PRIVATE)
    add(cut_extrude5_tool1.solids().sort_by(Axis((0, 29.364793, -12.5), (1, 0, 0)))[0], mode=Mode.SUBTRACT)

    # Sketch9 → Cut-Extrude6 (cut, up to next)
    with BuildSketch(Plane(origin=(60, 0, 0), x_dir=(0, 0, -1), z_dir=(1, 0, 0)), mode=Mode.PRIVATE) as cut_extrude6_sk1:
        with BuildLine():
            Line((15, 29), (15, 34))
            Line((15, 34), (10, 34))
            Line((10, 34), (10, 29))
            ThreePointArc((10, 29), (12.5, 26.5), (15, 29))
        make_face()
    cut_extrude6_tool1 = extrude(cut_extrude6_sk1.sketch, amount=-CUT_EXTRUDE6_REACH, mode=Mode.PRIVATE) & part.part
    add(cut_extrude6_tool1.solids().sort_by_distance((60, 30.495896, -12.5))[0], mode=Mode.SUBTRACT)


solid = part.part
